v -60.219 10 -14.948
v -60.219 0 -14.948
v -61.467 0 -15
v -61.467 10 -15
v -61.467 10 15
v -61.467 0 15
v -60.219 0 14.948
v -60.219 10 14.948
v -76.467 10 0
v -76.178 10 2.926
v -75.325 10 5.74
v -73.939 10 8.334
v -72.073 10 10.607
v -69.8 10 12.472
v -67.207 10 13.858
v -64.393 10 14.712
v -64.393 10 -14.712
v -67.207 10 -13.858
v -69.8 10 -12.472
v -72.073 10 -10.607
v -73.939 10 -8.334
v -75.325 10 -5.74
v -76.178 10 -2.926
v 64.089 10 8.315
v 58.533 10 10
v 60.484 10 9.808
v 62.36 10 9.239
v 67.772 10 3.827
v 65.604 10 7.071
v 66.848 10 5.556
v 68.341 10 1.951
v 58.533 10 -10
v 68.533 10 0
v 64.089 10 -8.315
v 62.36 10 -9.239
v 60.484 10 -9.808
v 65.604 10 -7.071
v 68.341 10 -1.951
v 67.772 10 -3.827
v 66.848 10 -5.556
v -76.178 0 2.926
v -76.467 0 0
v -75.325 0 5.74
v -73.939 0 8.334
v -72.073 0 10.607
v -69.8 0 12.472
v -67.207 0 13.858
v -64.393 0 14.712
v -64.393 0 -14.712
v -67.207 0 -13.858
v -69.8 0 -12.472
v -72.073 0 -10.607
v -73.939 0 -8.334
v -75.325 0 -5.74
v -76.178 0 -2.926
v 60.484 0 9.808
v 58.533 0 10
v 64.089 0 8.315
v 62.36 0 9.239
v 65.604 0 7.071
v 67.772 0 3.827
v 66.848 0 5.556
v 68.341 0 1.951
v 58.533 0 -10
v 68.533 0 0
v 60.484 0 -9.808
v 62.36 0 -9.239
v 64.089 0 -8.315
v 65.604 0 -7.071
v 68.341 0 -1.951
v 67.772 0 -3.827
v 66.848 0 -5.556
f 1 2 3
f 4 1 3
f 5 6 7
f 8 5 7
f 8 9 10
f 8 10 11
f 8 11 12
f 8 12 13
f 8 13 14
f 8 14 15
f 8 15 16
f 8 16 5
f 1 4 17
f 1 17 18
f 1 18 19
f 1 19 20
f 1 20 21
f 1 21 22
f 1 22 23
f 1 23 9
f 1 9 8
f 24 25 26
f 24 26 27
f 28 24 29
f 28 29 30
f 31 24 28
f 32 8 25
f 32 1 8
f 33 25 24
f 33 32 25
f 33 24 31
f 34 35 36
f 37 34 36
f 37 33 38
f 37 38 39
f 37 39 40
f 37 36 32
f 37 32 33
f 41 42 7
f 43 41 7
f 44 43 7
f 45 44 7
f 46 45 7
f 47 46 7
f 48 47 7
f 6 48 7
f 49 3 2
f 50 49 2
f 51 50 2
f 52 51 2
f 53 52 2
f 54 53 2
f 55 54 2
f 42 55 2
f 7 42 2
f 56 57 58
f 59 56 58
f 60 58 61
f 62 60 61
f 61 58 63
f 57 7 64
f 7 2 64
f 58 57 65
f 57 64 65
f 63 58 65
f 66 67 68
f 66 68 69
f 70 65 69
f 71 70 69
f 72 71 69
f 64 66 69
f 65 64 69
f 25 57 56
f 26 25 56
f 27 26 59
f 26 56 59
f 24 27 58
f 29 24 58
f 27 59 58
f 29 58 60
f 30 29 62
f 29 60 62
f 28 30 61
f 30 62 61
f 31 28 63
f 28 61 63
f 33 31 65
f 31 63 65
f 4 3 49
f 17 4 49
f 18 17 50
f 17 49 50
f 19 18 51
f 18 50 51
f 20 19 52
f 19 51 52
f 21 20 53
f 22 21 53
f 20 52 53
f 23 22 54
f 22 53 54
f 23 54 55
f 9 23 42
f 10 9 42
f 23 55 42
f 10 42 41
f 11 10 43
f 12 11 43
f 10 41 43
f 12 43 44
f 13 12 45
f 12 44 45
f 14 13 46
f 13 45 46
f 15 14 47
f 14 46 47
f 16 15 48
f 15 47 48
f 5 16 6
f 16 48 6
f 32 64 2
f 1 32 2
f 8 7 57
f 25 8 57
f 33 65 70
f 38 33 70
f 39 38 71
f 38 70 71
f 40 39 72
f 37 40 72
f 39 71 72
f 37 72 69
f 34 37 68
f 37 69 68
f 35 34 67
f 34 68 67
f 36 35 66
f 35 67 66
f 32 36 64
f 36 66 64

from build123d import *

# Parameters (mm, degrees)
BOSS_EXTRUDE1_DEPTH = 10


with BuildPart() as part:
    # Sketch1 → Boss-Extrude1 (new body)
    with BuildSketch(Plane(origin=(0, 0, 0), x_dir=(1, 0, 0), z_dir=(0, 1, 0))):
        with BuildLine():
            Line((58.533362025, 10), (-60.218804352, 14.948006932))
            ThreePointArc((-60.218804352, 14.948006932), (-50.427672798, 10.155847962), (-46.466637975, 0))
            ThreePointArc((-46.466637975, 0), (-50.427672798, -10.155847962), (-60.218804352, -14.948006932))
            Line((-60.218804352, -14.948006932), (58.533362025, -10))
            ThreePointArc((58.533362025, -10), (48.533362025, 0), (58.533362025, 10))
        make_face()
        with BuildLine():
            Line((-61.466637975, -15), (-61.466637975, 15))
            ThreePointArc((-61.466637975, 15), (-76.466637975, 0), (-61.466637975, -15))
        make_face()
        with BuildLine():
            ThreePointArc((68.533362025, 0), (65.604429837, 7.071067812), (58.533362025, 10))
            Line((58.533362025, 10), (58.533362025, -10))
            ThreePointArc((58.533362025, -10), (65.604429837, -7.071067812), (68.533362025, 0))
        make_face()
        with BuildLine():
            Line((58.533362025, -10), (58.533362025, 10))
            ThreePointArc((58.533362025, 10), (48.533362025, 0), (58.533362025, -10))
        make_face()
        with BuildLine():
            Line((-60.218804352, 14.948006932), (-61.466637975, 15))
            Line((-61.466637975, 15), (-61.466637975, -15))
            Line((-61.466637975, -15), (-60.218804352, -14.948006932))
            ThreePointArc((-60.218804352, -14.948006932), (-50.427672798, -10.155847962), (-46.466637975, 0))
            ThreePointArc((-46.466637975, 0), (-50.427672798, 10.155847962), (-60.218804352, 14.948006932))
        make_face()
    extrude(amount=BOSS_EXTRUDE1_DEPTH)


solid = part.part
